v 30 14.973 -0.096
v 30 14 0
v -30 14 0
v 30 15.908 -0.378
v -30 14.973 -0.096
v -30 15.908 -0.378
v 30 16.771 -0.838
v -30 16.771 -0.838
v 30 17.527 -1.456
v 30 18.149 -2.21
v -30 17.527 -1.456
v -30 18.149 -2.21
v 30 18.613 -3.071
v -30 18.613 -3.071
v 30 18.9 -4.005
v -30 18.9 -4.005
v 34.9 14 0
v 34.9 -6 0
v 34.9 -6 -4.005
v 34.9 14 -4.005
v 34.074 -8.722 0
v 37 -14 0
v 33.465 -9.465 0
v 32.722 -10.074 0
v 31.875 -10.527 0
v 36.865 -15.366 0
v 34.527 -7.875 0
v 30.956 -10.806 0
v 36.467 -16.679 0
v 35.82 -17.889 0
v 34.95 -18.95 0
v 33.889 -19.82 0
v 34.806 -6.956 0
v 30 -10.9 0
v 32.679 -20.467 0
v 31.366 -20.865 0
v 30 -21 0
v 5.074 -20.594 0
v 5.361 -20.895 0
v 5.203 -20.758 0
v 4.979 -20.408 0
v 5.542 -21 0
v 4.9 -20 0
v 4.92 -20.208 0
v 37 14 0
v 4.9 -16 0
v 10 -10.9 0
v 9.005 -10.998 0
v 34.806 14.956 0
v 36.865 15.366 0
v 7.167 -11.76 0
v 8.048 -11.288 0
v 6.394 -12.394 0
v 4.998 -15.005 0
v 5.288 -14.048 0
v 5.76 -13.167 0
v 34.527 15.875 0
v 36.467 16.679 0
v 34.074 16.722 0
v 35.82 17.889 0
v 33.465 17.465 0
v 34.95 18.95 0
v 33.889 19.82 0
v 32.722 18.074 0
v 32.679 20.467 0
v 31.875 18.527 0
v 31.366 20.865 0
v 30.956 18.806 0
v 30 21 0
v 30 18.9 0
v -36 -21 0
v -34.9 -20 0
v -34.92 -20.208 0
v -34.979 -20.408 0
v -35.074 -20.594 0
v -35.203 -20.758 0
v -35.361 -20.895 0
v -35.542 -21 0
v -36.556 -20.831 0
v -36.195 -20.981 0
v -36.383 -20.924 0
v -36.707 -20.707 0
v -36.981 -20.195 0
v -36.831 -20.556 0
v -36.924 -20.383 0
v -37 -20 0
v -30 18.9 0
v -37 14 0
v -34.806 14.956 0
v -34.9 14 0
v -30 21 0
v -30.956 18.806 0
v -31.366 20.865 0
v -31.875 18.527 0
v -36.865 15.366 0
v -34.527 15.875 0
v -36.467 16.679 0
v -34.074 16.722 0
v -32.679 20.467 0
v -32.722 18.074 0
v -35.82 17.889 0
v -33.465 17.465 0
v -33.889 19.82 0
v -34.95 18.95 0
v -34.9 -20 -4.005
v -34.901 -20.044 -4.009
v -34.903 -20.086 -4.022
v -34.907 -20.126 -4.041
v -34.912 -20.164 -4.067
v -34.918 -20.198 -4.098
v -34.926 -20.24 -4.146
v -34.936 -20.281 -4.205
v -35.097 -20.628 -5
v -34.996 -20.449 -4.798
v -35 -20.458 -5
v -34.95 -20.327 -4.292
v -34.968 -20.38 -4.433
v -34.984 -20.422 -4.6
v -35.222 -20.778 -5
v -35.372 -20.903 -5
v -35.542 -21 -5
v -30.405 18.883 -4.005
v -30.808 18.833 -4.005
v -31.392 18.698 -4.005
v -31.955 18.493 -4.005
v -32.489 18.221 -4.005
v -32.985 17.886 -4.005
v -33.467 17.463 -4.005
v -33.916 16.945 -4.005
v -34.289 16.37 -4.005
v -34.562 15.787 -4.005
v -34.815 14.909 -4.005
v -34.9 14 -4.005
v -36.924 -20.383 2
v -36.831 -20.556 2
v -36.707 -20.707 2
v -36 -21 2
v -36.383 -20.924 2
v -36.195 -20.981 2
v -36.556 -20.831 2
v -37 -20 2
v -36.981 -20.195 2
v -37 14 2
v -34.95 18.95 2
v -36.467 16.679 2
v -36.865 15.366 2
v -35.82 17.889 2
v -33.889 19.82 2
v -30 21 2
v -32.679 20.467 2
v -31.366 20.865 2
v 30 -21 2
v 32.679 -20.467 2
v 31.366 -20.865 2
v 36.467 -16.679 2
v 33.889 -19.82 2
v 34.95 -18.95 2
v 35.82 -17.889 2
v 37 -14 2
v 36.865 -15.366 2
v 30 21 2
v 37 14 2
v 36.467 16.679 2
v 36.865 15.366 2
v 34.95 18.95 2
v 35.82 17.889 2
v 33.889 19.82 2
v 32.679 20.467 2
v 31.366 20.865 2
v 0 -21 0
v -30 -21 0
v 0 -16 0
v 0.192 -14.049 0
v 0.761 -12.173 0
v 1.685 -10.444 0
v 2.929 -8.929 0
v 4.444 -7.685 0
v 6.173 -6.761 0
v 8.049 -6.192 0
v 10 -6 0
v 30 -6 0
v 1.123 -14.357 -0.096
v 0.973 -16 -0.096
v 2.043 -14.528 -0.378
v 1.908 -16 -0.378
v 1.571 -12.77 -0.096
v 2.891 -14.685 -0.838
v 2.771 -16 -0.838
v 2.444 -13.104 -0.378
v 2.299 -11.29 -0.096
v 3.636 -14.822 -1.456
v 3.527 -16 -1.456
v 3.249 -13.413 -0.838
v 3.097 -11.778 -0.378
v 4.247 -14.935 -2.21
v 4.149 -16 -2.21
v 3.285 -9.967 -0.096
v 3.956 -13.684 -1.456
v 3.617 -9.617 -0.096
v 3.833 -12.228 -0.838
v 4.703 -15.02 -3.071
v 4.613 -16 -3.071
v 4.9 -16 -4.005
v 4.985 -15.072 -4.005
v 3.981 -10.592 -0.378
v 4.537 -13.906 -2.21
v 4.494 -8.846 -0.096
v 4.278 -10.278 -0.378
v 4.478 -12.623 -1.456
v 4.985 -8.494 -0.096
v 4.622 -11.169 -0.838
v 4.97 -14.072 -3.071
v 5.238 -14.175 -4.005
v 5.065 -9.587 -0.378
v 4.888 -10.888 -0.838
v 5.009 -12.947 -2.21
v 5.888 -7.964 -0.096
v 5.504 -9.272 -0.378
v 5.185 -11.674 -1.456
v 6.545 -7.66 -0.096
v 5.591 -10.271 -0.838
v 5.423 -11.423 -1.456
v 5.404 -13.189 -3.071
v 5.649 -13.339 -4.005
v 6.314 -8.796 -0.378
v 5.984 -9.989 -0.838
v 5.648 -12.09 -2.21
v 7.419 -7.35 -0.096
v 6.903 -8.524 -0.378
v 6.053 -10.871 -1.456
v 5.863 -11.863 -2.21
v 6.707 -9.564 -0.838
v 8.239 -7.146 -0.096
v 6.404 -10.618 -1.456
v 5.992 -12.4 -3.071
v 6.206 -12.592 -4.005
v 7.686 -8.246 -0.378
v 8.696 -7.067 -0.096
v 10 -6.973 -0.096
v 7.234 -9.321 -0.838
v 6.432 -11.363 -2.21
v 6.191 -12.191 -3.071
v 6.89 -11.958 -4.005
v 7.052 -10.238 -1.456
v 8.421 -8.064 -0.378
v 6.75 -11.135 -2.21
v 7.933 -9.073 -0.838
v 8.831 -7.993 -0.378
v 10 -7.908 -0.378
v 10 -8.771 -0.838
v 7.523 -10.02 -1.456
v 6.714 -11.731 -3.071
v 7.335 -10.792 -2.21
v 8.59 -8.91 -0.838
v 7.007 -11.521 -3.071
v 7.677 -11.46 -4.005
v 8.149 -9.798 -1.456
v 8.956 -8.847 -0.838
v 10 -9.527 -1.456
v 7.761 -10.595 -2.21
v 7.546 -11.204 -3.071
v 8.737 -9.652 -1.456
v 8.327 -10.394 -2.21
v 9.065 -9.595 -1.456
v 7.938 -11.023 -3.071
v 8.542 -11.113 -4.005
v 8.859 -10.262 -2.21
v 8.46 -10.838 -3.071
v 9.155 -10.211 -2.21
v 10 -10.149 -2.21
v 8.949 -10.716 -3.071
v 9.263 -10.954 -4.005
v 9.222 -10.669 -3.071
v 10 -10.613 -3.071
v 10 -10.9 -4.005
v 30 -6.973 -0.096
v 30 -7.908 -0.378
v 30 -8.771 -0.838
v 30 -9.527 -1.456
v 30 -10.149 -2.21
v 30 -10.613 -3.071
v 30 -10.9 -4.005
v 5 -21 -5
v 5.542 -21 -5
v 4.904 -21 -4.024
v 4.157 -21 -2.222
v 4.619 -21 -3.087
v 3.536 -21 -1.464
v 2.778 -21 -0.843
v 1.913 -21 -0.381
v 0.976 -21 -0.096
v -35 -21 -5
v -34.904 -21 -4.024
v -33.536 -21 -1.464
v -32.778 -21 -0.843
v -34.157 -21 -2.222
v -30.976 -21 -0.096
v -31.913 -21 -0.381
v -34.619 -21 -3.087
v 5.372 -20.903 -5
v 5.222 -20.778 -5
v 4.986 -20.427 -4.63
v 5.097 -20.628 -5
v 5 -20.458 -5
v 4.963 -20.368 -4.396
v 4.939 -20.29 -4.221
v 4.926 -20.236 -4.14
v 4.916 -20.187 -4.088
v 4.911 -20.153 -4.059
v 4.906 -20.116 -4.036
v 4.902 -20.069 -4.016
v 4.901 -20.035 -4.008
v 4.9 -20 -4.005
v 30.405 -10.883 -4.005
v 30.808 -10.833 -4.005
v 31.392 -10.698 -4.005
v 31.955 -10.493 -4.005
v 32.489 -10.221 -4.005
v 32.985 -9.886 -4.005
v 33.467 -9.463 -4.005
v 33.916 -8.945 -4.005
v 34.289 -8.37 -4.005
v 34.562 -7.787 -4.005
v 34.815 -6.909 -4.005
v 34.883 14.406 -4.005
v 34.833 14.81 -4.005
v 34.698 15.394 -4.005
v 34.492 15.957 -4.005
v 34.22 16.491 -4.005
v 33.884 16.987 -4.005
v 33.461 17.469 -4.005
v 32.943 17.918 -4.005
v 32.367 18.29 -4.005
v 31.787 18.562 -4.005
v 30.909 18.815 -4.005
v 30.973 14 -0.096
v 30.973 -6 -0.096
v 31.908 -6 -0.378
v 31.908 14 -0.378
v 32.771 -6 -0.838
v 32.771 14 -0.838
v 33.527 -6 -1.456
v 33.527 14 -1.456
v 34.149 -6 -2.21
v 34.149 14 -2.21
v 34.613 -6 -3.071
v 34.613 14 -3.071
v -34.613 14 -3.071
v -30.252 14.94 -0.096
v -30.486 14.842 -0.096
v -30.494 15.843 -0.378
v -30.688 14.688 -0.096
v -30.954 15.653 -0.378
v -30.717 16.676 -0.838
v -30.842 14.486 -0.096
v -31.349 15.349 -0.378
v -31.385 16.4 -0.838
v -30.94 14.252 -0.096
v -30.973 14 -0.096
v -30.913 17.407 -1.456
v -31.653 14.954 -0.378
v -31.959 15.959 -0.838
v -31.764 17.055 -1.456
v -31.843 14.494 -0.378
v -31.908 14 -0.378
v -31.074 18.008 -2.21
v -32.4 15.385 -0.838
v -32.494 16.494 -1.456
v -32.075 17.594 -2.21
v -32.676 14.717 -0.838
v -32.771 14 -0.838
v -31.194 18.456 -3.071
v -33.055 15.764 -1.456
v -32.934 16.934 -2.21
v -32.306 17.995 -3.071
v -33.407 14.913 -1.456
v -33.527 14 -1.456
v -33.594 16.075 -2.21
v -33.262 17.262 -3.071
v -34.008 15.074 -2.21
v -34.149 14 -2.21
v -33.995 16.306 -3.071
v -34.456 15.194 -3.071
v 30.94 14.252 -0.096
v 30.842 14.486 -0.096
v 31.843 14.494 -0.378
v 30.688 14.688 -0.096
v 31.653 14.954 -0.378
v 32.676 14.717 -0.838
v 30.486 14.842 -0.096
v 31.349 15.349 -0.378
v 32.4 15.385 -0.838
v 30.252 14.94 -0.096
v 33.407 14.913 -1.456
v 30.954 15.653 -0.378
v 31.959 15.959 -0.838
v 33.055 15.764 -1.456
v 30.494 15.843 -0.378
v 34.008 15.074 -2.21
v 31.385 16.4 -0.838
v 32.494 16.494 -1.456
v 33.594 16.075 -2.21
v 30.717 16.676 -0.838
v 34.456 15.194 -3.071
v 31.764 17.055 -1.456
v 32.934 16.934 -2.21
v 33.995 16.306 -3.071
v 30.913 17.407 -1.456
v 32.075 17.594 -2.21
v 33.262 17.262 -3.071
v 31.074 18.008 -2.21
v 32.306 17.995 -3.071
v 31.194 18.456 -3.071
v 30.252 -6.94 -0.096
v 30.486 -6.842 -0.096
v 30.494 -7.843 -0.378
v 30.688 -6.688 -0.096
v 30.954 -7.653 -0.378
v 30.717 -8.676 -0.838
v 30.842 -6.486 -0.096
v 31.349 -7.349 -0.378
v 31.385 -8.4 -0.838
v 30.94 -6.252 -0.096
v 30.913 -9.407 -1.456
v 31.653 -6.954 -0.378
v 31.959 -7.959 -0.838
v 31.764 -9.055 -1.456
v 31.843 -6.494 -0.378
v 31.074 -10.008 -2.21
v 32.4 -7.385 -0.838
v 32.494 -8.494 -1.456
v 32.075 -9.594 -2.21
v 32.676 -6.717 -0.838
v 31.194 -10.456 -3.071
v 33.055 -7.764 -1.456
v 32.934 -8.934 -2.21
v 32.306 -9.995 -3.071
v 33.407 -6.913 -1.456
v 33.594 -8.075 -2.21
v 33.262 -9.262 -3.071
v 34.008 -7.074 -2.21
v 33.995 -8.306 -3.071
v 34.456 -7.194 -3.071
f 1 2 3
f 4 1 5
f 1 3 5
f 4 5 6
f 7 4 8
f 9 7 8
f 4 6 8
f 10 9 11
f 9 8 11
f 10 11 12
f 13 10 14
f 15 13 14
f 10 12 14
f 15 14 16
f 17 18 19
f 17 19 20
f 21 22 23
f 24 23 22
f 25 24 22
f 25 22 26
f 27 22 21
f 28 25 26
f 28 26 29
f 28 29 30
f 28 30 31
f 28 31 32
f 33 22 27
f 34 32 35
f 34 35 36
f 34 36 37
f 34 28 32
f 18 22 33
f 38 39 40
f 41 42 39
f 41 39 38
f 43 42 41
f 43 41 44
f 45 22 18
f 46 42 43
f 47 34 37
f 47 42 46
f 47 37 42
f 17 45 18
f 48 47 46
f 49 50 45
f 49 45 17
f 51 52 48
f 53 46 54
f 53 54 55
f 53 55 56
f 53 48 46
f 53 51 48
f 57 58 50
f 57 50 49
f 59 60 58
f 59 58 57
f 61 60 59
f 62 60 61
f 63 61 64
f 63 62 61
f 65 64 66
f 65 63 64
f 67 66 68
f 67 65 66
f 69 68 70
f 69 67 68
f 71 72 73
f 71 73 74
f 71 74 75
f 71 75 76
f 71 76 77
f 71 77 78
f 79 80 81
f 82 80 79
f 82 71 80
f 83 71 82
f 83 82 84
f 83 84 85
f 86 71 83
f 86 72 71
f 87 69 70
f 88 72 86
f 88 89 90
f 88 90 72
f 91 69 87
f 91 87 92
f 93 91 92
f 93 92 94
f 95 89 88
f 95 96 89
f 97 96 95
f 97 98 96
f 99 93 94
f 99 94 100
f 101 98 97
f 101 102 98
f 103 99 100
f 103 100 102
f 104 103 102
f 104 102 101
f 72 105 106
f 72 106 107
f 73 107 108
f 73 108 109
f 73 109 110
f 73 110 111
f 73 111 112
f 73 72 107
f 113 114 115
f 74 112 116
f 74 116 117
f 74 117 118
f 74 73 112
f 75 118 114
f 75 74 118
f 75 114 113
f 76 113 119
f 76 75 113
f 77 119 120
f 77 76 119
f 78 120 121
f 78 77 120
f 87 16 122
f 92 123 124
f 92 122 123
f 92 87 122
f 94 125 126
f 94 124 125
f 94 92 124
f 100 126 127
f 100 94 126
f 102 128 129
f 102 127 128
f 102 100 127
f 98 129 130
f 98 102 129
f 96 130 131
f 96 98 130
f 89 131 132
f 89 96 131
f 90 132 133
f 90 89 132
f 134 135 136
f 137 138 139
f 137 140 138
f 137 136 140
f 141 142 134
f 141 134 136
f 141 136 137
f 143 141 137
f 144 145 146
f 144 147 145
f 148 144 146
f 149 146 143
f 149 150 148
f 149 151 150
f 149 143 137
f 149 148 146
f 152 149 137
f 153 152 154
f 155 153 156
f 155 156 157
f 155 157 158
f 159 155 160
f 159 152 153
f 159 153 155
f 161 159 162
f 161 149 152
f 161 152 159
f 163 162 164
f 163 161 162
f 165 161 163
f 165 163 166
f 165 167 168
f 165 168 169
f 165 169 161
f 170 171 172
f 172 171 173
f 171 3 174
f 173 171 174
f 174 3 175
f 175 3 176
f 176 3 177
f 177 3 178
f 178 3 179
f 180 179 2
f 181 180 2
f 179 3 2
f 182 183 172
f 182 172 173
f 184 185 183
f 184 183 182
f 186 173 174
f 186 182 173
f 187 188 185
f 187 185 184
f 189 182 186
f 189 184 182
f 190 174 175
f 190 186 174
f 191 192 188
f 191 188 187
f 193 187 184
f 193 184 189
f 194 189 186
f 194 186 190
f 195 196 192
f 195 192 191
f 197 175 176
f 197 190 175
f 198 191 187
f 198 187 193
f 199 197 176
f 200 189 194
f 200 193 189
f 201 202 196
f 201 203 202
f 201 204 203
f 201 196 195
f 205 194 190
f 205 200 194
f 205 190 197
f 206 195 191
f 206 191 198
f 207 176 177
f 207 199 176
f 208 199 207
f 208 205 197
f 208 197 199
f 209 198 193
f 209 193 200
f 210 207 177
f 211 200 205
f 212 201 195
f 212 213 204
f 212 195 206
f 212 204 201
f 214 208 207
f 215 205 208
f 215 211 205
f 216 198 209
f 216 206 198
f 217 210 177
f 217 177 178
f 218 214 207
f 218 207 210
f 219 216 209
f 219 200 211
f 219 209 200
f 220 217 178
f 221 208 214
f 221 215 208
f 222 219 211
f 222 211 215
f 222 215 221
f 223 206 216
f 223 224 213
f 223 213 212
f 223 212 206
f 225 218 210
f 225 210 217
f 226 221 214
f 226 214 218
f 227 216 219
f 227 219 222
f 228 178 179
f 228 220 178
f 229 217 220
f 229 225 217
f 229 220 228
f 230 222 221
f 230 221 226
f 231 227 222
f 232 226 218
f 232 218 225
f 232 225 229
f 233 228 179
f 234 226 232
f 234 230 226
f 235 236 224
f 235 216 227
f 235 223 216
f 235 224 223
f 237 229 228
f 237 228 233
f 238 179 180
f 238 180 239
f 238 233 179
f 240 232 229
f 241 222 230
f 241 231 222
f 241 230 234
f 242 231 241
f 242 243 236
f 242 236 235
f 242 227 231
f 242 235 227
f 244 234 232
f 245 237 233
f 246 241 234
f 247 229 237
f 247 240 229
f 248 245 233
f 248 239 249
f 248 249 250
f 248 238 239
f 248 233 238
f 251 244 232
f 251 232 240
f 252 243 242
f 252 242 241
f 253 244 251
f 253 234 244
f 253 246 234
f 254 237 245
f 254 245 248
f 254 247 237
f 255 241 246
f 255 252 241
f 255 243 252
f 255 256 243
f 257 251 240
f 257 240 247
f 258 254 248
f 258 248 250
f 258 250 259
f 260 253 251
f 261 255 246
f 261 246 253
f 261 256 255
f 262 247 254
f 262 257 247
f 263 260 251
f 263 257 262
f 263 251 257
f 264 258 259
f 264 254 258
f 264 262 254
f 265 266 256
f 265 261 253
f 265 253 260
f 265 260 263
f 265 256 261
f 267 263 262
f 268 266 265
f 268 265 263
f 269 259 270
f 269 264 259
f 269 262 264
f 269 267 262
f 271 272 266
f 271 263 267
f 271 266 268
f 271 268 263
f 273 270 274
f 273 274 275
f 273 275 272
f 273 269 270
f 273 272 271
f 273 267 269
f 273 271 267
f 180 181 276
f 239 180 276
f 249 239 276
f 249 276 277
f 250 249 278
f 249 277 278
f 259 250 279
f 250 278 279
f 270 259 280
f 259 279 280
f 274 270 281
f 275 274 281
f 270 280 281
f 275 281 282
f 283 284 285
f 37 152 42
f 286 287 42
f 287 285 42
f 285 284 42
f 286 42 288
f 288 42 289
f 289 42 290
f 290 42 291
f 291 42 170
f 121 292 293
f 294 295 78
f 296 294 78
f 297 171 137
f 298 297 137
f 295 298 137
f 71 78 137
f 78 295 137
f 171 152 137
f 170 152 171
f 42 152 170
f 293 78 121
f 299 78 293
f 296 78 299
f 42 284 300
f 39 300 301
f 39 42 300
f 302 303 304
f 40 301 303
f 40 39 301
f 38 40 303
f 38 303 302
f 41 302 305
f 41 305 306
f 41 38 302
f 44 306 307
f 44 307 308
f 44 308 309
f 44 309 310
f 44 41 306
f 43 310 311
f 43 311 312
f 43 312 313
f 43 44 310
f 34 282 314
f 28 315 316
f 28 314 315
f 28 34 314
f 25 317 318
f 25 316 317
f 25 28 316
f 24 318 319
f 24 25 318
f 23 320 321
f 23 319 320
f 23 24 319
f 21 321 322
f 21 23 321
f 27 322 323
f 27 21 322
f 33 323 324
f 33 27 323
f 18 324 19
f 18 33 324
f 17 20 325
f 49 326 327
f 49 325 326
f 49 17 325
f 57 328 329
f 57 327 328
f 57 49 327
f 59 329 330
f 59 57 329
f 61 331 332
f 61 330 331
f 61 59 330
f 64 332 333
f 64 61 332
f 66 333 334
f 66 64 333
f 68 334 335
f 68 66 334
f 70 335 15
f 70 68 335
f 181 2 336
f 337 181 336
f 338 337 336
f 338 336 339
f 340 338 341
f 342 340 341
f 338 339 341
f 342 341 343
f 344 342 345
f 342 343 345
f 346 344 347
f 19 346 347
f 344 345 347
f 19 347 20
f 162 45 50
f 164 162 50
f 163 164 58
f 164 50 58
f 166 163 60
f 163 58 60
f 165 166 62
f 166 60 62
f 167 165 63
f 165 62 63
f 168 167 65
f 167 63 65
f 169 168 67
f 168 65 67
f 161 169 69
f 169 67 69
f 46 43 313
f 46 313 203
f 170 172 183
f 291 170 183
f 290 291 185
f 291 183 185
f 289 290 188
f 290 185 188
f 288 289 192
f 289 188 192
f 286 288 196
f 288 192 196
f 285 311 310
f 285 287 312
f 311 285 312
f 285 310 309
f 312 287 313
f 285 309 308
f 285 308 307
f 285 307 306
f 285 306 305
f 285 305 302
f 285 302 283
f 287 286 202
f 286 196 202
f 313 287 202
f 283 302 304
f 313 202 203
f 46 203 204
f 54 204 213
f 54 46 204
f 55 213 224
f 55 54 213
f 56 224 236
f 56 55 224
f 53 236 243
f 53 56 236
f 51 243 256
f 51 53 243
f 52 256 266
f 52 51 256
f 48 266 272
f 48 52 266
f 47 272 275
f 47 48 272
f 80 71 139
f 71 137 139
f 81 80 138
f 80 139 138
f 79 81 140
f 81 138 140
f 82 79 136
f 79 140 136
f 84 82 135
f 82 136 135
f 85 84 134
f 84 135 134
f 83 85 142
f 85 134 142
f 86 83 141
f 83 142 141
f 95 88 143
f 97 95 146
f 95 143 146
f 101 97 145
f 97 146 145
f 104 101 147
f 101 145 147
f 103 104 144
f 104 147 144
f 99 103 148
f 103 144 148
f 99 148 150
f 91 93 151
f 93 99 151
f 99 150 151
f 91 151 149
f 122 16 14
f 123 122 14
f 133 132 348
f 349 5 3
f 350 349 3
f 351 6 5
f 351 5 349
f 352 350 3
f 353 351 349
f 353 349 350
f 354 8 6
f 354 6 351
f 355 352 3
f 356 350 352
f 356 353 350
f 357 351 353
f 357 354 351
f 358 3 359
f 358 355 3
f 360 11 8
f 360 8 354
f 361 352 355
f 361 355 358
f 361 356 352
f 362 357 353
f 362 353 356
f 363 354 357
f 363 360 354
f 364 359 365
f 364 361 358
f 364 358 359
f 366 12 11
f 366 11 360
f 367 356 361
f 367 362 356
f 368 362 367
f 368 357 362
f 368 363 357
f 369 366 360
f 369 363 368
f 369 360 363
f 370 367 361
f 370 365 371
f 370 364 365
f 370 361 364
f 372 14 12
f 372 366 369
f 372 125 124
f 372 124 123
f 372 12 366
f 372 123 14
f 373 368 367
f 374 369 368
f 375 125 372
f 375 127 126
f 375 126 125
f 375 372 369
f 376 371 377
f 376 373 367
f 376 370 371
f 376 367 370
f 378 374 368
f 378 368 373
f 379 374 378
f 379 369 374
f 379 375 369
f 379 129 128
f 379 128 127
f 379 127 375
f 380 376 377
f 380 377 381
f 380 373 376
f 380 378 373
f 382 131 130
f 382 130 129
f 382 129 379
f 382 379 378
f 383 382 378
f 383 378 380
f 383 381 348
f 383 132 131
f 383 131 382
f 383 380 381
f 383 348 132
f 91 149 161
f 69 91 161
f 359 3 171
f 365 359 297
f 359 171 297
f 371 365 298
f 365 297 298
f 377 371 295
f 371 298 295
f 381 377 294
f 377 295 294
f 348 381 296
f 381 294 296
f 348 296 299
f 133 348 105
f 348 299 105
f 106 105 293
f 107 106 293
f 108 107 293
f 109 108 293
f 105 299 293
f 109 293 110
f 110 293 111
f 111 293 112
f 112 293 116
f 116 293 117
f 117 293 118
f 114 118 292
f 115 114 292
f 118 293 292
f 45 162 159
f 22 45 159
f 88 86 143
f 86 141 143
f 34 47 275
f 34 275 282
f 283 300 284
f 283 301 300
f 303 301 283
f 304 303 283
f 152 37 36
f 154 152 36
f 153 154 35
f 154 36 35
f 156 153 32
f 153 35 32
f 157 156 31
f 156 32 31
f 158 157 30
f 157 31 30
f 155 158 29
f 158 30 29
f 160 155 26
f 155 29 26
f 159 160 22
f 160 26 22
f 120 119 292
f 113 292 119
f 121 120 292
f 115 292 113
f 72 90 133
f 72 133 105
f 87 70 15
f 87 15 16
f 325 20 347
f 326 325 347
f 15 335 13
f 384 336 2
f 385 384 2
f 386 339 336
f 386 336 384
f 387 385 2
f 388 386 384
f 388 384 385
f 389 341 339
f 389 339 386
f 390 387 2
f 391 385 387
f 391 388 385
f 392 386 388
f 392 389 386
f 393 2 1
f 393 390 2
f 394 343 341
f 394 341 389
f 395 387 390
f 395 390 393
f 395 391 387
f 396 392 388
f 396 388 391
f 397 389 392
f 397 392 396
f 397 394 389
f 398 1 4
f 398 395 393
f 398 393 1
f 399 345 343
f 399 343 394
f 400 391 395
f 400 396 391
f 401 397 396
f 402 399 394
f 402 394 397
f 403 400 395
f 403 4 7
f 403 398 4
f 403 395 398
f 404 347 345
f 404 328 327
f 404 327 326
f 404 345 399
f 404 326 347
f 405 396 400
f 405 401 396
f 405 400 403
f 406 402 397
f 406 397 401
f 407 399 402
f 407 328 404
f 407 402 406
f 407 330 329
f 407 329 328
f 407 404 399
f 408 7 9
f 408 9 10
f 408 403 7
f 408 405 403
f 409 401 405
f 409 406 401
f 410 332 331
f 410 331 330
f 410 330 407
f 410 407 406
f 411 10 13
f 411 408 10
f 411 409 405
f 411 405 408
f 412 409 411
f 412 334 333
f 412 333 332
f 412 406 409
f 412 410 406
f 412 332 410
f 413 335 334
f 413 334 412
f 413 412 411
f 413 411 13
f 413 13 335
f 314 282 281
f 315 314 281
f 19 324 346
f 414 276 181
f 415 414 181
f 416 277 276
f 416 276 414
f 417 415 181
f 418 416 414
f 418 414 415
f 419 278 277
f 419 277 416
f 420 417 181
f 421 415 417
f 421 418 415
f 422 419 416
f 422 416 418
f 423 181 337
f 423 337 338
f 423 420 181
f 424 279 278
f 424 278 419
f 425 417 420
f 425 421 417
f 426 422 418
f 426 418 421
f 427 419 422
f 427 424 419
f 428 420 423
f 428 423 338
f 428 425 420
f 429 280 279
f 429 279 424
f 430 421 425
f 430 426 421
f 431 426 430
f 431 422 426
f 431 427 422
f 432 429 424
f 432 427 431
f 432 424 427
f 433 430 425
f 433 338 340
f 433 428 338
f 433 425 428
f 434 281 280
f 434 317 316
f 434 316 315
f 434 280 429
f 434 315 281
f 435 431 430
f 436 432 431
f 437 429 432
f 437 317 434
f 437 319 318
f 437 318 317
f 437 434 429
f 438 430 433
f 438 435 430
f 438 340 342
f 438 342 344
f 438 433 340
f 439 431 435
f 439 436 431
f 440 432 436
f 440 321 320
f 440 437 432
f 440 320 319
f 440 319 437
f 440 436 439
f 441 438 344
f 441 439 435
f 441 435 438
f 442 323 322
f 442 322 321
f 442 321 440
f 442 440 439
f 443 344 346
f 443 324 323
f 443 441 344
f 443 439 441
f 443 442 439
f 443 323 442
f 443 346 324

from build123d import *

# Parameters (mm, degrees)
SKETCH1_W           = 74
SKETCH1_H           = 42
BOSS_EXTRUDE1_DEPTH = 2
BOSS_EXTRUDE2_DEPTH = 5
FILLET2_R           = 5
FILLET3_R           = 5
FILLET4_R           = 7
CUT_EXTRUDE2_DEPTH  = 5
FILLET6_R           = 1


with BuildPart() as part:
    # Sketch1 → Boss-Extrude1 (new body)
    with BuildSketch(Plane.XY):
        Rectangle(SKETCH1_W, SKETCH1_H)
    extrude(amount=BOSS_EXTRUDE1_DEPTH)

    # Sketch2 → Boss-Extrude2 (add)
    with BuildSketch(Plane(origin=(0, 0, 0), x_dir=(-1, 0, 0), z_dir=(0, 0, -1))):
        Polygon((37, 21), (-37, 21), (-37, -21), (-5, -21), (-5, -11), (-35, -11), (-35, 19), (35, 19), (35, -21), (37, -21), align=None)
    extrude(amount=BOSS_EXTRUDE2_DEPTH)

    # Fillet2
    fillet2_edges = [part.edges().sort_by_distance(p)[0] for p in [
        (5, -11, -2.5),
        (35, -11, -2.5),
        (35, 19, -2.5),
        (-35, 19, -2.5),
    ]]
    fillet(fillet2_edges, radius=FILLET2_R)

    # Fillet3
    fillet3_edges = [part.edges().sort_by_distance(p)[0] for p in [
        (5, -18.5, 0),
        (6.464466094, -12.464466094, 0),
        (20, -11, 0),
        (33.535533906, -9.535533906, 0),
        (35, 4, 0),
        (33.535533906, 17.535533906, 0),
        (-35, -3.5, 0),
        (-33.535533906, 17.535533906, 0),
        (0, 19, 0),
    ]]
    fillet(fillet3_edges, radius=FILLET3_R - 0.0001)  # a hair under: the kernel refuses the full size

    # Fillet4
    fillet4_edges = [part.edges().sort_by_distance(p)[0] for p in [
        (-37, 21, -1.5),
        (37, 21, -1.5),
        (37, -21, -1.5),
    ]]
    fillet(fillet4_edges, radius=FILLET4_R)

    # Sketch3 → Cut-Extrude2 (cut)
    with BuildSketch(Plane(origin=(0, 0, 0), x_dir=(-1, 0, 0), z_dir=(0, 0, -1))):
        with BuildLine():
            Line((37.1, 21.1), (-37.1, 21.1))
            Line((-37.1, 21.1), (-37.1, -21.1))
            Line((-37.1, -21.1), (-6, -21.1))
            ThreePointArc((-6, -21.1), (-5.222182541, -20.777817459), (-4.9, -20))
            Line((-4.9, -20), (-4.9, -16))
            ThreePointArc((-4.9, -16), (-6.393755416, -12.393755416), (-10, -10.9))
            Line((-10, -10.9), (-30, -10.9))
            ThreePointArc((-30, -10.9), (-33.464823228, -9.464823228), (-34.9, -6))
            Line((-34.9, -6), (-34.9, 14))
            ThreePointArc((-34.9, 14), (-33.464823228, 17.464823228), (-30, 18.9))
            Line((-30, 18.9), (30, 18.9))
            ThreePointArc((30, 18.9), (33.464823228, 17.464823228), (34.9, 14))
            Line((34.9, 14), (34.9, -20))
            ThreePointArc((34.9, -20), (35.222182541, -20.777817459), (36, -21.1))
            Line((36, -21.1), (37.1, -21.1))
            Line((37.1, -21.1), (37.1, 21.1))
        make_face()
    extrude(amount=CUT_EXTRUDE2_DEPTH, mode=Mode.SUBTRACT)

    # Fillet6
    fillet6_edges = [part.edges().sort_by_distance(p)[0] for p in [
        (-37, -21, 1),
    ]]
    fillet(fillet6_edges, radius=FILLET6_R)


solid = part.part
